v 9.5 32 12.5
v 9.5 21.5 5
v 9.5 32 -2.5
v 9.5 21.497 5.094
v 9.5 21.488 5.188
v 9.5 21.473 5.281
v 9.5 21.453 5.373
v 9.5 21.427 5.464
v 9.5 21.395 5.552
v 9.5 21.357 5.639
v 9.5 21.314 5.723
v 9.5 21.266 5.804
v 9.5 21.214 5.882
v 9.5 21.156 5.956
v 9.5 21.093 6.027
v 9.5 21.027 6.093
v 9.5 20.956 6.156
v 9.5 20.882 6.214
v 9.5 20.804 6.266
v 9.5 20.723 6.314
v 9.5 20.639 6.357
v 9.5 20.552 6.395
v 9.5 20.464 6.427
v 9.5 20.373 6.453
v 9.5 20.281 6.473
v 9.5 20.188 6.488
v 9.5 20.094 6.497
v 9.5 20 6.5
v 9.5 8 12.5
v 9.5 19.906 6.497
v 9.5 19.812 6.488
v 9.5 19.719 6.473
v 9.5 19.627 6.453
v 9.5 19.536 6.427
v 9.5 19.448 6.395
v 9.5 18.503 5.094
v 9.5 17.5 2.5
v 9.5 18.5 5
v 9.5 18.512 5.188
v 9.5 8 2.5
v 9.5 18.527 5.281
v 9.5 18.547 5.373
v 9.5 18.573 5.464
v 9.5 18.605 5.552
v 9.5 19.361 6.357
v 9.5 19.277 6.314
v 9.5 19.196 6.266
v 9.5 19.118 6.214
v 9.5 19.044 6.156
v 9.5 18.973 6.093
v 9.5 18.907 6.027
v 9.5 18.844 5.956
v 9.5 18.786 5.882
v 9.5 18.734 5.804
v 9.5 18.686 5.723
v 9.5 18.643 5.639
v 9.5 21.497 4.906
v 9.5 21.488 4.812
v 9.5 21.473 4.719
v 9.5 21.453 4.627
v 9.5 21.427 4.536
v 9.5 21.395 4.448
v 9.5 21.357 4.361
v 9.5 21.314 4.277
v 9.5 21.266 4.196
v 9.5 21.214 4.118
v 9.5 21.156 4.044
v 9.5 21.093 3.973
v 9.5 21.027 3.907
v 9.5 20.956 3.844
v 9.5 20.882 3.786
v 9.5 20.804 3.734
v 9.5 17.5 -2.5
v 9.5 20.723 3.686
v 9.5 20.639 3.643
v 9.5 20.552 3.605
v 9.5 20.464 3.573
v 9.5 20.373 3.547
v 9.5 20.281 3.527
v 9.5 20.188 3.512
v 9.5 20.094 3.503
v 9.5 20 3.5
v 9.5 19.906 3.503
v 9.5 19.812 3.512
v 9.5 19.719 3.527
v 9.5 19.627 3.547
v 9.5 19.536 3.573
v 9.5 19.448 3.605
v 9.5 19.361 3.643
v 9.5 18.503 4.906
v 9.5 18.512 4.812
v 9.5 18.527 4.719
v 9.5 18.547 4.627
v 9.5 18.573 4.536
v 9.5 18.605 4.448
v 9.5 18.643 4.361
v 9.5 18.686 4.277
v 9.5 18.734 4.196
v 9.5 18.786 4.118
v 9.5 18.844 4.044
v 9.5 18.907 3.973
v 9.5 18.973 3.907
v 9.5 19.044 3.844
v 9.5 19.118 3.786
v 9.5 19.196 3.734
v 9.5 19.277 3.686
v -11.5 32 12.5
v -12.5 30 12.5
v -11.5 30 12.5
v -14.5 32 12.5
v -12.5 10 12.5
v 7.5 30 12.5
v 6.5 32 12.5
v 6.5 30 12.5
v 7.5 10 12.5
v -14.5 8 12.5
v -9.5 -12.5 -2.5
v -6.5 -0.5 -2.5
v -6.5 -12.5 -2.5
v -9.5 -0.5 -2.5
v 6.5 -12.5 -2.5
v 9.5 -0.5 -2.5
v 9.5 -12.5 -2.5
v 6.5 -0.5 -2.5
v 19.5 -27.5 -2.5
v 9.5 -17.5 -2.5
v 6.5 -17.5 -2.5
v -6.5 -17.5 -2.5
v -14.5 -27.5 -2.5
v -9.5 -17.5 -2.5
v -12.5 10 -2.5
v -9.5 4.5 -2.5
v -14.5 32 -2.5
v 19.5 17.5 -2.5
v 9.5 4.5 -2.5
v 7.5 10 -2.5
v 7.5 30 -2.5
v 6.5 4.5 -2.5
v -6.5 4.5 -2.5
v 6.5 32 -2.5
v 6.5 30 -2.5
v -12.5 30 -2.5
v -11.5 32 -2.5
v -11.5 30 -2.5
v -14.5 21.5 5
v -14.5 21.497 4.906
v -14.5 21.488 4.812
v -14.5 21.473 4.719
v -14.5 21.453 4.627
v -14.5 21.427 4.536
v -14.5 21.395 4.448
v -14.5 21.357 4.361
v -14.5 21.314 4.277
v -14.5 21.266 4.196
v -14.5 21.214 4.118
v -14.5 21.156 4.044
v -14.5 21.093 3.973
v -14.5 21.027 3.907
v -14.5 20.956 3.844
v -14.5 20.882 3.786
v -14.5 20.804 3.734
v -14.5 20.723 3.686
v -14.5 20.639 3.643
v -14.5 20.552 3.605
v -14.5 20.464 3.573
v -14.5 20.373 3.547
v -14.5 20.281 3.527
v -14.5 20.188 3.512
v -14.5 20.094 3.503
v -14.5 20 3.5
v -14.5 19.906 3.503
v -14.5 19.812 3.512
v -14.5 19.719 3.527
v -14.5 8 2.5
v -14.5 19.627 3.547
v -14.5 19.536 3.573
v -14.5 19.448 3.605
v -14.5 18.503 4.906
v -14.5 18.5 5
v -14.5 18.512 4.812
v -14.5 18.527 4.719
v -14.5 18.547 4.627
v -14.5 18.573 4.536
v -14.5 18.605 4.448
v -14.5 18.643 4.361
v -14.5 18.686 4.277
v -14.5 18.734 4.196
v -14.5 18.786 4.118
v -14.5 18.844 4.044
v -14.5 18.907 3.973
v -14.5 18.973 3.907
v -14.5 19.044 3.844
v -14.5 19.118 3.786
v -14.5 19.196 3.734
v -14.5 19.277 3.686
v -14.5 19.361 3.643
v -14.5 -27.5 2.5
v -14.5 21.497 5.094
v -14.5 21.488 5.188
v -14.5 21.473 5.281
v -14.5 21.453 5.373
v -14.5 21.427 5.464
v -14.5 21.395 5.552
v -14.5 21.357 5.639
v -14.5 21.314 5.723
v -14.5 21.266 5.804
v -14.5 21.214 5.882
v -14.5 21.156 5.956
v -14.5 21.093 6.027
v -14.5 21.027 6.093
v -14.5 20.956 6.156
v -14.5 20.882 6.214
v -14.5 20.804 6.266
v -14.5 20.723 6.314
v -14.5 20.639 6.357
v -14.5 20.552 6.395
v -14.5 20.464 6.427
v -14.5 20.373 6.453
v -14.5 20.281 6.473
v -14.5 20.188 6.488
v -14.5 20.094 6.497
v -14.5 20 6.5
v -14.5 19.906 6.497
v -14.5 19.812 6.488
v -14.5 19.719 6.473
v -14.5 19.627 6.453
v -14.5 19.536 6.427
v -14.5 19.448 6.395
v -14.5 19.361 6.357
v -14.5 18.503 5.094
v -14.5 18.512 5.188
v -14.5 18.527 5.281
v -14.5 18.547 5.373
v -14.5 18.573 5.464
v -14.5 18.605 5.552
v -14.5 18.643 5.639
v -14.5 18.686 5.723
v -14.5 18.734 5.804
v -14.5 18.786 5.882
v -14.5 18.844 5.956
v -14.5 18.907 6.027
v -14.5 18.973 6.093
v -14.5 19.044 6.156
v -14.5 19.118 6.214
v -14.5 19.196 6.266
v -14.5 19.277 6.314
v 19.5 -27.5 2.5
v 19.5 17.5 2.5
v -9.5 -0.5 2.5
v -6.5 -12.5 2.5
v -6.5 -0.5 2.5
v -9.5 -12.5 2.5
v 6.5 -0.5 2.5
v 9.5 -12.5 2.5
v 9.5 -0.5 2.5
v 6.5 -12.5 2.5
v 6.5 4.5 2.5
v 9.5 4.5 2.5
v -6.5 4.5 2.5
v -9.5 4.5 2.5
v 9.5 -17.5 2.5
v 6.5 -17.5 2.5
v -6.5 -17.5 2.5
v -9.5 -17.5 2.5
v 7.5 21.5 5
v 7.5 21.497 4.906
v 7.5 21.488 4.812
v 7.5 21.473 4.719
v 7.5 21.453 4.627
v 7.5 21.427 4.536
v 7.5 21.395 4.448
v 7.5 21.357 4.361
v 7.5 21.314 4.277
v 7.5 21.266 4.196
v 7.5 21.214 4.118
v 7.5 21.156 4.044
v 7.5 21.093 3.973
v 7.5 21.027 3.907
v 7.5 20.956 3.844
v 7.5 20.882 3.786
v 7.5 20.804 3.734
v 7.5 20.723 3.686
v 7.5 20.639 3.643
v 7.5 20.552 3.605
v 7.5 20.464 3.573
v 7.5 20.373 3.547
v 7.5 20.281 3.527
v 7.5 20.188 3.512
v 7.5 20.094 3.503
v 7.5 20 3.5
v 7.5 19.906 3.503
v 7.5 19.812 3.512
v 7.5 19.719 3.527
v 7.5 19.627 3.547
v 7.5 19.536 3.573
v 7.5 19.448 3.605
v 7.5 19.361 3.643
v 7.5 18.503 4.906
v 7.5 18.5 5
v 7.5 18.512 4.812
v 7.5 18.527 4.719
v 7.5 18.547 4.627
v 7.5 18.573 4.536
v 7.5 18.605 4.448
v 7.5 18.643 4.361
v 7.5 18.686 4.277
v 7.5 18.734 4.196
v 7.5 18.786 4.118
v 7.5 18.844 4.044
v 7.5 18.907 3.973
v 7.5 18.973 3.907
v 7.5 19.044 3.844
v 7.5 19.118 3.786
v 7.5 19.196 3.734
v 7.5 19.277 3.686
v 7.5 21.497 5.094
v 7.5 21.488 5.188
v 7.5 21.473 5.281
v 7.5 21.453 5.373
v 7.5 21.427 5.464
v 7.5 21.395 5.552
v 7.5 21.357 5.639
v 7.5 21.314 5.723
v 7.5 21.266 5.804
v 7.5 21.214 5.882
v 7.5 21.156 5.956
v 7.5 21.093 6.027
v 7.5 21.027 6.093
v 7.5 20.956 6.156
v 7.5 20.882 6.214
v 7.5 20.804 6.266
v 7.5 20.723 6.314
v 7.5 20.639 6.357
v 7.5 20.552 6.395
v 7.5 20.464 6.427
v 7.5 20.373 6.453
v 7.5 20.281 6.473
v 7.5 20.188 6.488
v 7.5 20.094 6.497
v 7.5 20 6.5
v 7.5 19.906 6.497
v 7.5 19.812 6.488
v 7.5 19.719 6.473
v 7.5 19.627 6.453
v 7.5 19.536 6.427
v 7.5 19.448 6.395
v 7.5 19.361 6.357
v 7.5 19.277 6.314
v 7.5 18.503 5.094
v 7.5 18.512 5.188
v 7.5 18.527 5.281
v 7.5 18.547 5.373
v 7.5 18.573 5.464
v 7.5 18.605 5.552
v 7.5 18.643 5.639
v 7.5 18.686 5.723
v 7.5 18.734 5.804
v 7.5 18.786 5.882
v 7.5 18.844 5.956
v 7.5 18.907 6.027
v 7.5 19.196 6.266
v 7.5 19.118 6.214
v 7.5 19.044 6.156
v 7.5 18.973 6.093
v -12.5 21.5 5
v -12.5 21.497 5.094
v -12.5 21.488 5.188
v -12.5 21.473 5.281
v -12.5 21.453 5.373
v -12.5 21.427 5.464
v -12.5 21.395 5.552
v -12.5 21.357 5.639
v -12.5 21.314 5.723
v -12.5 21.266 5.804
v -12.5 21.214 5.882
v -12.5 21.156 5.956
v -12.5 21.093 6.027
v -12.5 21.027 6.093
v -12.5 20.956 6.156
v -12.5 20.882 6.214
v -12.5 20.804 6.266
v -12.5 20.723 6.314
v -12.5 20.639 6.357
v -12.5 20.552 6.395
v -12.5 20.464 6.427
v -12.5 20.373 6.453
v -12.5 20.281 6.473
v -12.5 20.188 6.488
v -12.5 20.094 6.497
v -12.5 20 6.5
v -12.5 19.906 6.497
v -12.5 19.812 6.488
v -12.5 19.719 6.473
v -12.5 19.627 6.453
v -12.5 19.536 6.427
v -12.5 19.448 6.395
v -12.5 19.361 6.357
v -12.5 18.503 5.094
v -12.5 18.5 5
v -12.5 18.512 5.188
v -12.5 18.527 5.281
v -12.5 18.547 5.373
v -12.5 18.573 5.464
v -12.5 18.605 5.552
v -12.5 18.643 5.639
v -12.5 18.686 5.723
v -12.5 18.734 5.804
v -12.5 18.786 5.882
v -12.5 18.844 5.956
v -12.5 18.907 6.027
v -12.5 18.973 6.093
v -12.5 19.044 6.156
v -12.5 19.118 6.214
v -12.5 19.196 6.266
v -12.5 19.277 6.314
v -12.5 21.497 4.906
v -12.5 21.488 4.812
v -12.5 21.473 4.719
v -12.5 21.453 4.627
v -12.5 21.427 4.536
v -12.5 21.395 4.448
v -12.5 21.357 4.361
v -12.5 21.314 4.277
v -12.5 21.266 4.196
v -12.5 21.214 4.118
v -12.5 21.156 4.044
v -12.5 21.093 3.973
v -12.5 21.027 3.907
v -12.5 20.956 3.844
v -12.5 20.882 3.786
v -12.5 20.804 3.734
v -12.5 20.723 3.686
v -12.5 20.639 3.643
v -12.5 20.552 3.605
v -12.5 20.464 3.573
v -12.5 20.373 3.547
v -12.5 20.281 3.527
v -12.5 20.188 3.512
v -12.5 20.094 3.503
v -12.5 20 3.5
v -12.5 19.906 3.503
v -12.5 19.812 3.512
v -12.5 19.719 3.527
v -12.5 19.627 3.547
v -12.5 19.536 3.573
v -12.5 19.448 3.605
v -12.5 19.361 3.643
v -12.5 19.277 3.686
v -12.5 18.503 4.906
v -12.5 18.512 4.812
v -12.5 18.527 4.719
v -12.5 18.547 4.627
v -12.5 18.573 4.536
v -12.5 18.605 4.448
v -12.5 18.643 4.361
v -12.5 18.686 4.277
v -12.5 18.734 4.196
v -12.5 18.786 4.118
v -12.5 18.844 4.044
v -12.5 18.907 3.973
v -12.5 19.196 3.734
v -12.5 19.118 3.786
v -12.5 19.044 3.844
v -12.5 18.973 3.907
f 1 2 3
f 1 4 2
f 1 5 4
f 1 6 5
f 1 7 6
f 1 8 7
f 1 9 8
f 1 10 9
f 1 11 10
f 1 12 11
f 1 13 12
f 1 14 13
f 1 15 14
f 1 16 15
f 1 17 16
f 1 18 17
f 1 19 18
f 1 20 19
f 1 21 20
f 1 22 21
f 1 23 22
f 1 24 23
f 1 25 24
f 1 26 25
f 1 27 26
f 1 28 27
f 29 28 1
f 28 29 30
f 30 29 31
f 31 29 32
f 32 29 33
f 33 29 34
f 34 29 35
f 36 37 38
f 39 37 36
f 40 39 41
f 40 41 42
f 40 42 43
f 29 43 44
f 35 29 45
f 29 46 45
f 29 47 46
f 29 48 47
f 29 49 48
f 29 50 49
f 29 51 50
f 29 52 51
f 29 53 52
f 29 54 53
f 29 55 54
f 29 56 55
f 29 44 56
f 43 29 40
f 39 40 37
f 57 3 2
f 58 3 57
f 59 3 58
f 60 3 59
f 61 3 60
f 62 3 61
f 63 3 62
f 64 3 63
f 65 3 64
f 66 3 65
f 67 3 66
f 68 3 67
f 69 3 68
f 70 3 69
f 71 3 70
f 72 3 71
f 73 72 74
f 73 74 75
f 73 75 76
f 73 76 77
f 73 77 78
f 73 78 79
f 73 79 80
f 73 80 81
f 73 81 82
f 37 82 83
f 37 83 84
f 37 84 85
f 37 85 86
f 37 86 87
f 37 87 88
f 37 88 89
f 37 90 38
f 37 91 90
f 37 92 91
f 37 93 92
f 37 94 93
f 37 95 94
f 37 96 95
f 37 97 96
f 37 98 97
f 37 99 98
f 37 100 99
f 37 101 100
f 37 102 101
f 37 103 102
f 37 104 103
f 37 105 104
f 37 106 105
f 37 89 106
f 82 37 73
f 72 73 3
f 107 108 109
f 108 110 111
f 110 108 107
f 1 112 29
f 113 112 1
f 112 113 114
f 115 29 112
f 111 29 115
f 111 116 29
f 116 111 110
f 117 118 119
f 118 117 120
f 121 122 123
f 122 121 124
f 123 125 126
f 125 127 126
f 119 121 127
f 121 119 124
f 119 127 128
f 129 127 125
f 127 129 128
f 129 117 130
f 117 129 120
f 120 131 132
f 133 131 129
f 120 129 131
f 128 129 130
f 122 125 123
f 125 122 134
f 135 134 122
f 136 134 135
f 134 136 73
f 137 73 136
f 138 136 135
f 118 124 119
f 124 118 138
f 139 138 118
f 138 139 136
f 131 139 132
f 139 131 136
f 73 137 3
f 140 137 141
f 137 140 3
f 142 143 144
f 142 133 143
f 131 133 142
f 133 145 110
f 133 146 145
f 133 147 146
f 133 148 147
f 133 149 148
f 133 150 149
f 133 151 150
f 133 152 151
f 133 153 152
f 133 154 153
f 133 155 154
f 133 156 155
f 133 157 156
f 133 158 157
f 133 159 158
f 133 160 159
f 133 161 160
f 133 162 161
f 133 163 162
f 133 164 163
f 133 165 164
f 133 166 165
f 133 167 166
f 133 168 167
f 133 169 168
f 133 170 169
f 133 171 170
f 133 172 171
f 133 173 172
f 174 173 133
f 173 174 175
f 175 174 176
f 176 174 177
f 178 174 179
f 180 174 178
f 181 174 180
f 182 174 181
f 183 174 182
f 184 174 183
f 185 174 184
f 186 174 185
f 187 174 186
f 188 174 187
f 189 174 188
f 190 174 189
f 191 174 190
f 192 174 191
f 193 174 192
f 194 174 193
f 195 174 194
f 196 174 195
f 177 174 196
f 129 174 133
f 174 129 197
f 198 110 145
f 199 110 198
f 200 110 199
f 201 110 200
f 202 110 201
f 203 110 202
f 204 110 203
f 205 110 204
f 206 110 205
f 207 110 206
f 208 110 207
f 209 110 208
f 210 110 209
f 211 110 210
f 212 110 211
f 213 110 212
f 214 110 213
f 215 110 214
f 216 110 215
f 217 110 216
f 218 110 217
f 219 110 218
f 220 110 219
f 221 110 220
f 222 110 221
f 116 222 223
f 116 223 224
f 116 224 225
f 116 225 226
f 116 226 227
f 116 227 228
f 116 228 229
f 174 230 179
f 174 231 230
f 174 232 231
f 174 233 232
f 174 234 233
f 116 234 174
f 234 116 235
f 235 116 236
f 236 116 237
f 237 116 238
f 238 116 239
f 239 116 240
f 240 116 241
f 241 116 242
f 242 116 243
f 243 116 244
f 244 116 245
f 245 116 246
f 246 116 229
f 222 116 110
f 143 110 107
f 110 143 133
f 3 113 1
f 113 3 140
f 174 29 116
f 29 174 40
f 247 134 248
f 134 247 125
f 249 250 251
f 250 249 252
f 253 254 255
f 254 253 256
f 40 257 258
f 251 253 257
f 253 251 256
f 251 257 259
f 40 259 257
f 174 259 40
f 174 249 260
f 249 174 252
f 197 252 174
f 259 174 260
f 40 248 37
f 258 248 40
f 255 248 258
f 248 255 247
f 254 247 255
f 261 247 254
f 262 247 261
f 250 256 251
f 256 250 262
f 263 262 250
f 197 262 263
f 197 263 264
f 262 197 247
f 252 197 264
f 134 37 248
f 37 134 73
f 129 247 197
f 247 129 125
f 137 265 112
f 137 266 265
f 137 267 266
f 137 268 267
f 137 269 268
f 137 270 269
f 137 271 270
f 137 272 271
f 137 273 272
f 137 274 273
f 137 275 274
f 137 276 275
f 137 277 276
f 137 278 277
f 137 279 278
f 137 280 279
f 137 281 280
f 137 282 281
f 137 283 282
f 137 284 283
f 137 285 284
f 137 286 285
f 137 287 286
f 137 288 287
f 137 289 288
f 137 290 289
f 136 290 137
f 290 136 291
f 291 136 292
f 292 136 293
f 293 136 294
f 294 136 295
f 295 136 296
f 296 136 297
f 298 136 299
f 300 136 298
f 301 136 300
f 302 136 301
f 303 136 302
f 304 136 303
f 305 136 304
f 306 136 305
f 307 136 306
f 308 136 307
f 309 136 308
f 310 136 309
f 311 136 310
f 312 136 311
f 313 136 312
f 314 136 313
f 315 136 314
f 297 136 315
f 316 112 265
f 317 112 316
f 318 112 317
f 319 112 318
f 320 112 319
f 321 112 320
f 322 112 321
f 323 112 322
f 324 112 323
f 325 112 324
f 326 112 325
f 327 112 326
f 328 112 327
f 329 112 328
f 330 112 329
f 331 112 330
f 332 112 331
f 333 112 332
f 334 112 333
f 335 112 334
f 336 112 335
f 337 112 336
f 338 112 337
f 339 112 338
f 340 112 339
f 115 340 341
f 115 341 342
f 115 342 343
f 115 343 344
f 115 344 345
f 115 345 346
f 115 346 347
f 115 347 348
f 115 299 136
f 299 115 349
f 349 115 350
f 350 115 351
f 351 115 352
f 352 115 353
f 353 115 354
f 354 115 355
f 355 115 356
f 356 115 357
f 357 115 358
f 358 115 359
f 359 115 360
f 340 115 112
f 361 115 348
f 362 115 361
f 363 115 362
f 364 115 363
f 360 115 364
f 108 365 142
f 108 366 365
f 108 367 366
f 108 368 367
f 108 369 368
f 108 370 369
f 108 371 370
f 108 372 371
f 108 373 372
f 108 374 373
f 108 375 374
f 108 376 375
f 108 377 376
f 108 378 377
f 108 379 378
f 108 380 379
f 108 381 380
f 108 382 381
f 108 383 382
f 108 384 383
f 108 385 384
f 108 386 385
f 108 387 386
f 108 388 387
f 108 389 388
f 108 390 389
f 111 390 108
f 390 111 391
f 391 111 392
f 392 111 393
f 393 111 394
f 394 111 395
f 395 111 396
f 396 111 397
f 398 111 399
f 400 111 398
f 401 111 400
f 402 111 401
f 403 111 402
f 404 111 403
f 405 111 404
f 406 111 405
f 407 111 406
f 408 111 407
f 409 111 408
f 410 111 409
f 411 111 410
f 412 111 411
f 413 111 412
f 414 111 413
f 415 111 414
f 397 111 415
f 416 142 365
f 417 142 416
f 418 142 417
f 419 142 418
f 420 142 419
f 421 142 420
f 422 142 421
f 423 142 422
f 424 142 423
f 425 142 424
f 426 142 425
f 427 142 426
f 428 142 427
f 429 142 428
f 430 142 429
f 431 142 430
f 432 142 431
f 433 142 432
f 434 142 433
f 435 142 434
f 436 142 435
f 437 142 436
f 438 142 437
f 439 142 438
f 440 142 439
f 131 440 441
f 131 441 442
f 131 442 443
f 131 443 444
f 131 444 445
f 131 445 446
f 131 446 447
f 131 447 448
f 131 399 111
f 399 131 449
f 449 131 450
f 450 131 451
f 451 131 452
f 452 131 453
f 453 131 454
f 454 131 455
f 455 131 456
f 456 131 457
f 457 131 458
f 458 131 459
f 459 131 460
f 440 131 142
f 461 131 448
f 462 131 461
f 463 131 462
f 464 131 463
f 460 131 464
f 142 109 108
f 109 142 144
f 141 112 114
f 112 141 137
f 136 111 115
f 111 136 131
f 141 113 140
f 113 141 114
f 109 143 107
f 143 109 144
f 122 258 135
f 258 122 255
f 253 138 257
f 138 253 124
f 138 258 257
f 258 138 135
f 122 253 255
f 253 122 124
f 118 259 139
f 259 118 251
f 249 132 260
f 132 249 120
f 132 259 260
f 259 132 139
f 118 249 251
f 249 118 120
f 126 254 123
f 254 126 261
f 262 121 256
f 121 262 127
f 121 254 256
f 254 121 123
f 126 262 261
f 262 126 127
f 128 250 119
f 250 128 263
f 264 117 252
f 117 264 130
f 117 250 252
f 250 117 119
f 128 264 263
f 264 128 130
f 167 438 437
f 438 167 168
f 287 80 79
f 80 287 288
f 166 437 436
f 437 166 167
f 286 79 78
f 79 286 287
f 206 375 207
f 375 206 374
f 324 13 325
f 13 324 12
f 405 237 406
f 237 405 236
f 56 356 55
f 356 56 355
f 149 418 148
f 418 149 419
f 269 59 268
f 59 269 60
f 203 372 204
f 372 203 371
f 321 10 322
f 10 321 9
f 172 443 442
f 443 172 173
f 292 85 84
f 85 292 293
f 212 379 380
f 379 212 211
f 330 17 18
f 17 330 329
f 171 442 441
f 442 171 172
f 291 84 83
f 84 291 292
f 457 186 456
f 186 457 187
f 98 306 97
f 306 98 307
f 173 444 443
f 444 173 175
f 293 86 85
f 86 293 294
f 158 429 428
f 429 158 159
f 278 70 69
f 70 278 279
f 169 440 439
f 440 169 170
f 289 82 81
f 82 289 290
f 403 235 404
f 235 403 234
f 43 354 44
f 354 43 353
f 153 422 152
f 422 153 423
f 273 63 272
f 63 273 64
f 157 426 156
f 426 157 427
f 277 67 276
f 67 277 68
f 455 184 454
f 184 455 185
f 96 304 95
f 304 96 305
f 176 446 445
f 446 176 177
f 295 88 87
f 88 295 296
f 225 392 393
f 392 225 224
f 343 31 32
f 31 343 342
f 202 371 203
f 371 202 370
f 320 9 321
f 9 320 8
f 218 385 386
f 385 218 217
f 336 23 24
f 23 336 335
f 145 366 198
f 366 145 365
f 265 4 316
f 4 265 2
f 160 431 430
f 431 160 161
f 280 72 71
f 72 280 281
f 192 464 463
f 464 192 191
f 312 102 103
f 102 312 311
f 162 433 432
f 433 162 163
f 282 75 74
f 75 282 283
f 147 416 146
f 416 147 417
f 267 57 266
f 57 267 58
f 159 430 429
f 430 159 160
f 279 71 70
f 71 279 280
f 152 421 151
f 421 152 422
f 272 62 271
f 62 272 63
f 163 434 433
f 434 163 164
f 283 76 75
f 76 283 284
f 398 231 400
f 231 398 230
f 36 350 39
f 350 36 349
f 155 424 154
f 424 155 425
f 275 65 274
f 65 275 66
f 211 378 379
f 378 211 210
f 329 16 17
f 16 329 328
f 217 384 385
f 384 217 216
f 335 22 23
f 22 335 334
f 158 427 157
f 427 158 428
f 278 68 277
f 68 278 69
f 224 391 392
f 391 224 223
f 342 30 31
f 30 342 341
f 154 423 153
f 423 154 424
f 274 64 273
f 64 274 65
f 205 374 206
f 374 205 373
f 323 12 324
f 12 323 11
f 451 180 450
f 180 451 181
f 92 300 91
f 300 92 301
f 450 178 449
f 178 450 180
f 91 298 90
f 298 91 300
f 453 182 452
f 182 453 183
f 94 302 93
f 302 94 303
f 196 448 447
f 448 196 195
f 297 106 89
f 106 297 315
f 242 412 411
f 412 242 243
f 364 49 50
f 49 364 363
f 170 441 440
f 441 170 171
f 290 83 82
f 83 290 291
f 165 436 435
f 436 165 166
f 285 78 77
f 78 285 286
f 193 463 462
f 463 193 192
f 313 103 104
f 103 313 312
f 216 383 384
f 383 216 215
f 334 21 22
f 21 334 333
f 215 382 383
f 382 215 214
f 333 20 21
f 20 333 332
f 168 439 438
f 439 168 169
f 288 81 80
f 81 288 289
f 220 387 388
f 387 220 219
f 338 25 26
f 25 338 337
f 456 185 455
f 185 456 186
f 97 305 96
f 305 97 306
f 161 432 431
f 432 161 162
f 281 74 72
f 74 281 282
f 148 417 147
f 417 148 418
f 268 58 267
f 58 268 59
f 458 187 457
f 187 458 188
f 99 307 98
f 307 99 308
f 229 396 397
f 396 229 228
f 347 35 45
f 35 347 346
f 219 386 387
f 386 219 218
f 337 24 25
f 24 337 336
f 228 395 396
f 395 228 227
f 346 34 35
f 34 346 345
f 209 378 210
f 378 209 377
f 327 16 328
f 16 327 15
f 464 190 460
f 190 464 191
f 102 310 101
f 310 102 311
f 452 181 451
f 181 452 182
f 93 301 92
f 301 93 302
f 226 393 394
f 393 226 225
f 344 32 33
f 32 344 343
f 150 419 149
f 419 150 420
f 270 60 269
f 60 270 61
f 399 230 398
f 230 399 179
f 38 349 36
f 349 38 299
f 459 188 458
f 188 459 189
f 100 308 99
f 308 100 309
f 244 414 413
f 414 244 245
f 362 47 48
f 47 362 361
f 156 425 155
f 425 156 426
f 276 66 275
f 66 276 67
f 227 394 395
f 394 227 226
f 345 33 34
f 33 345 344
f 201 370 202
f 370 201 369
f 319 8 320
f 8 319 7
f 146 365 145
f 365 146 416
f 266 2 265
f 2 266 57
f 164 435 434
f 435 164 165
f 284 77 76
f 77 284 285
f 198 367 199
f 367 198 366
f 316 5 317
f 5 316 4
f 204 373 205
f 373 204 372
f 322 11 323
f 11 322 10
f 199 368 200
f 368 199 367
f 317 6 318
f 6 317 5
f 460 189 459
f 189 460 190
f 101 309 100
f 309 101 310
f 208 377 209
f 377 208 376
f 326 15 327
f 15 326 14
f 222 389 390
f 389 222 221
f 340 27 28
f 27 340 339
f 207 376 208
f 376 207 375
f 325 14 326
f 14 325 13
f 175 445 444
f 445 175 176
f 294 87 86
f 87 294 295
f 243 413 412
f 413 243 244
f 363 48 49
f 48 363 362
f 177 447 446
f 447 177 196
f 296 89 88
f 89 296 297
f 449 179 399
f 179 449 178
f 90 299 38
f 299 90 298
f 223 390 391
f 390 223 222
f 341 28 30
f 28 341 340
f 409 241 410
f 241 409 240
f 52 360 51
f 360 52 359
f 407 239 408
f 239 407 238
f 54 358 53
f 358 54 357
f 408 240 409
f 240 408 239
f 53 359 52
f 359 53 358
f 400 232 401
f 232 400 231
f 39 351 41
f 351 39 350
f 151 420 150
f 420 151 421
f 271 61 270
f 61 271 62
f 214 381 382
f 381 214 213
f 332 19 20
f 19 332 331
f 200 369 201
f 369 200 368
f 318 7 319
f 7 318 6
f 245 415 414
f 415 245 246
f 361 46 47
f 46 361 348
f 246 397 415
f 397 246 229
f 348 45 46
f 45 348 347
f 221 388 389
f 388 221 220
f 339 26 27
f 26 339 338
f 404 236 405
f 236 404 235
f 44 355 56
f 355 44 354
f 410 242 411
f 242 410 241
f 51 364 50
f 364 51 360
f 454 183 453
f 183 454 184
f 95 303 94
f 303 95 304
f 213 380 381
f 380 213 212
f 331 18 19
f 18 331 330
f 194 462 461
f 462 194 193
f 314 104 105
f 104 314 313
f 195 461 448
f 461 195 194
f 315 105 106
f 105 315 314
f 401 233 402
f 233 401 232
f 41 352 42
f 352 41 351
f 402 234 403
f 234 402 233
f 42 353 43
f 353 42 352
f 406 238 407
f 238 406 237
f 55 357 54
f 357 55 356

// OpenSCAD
// WASABI Niko FDM Printer
// X easy limit mod
// GNU GPL v3
// SANTA no Mix
// https://ameblo.jp/math-physics/theme-10117154956.html
// https://github.com/SantaNoMix/
$fn = 100;
difference () {
    union () {
        translate ([-2.5,20,5]) {
            cube ([24,24,15],center = true);
        }
        translate ([2.5,-5,0]) {
            cube ([34,45,5],center = true);
        }
    }
    translate ([-2.5,20,0]) {
        cube ([20,20,28],center = true);
    }
    translate ([-2.5,25,0]) {
        cube ([18,20,26],center = true);
    }
    translate ([8,2,0]) {
        cube ([3,5,30],center = true);
        }
    translate ([-8,2,0]) {
        cube ([3,5,30],center = true);
    }
    translate ([8,-15,0]) {
        cube ([3,5,30],center = true);
    }
    translate ([-8,-15,0]) {
        cube ([3,5,30],center = true);
    }
    translate ([-40,20,5]) {
        rotate ([0,90,0]) {
            cylinder (90,1.5,1.5);
        }
    }
}
